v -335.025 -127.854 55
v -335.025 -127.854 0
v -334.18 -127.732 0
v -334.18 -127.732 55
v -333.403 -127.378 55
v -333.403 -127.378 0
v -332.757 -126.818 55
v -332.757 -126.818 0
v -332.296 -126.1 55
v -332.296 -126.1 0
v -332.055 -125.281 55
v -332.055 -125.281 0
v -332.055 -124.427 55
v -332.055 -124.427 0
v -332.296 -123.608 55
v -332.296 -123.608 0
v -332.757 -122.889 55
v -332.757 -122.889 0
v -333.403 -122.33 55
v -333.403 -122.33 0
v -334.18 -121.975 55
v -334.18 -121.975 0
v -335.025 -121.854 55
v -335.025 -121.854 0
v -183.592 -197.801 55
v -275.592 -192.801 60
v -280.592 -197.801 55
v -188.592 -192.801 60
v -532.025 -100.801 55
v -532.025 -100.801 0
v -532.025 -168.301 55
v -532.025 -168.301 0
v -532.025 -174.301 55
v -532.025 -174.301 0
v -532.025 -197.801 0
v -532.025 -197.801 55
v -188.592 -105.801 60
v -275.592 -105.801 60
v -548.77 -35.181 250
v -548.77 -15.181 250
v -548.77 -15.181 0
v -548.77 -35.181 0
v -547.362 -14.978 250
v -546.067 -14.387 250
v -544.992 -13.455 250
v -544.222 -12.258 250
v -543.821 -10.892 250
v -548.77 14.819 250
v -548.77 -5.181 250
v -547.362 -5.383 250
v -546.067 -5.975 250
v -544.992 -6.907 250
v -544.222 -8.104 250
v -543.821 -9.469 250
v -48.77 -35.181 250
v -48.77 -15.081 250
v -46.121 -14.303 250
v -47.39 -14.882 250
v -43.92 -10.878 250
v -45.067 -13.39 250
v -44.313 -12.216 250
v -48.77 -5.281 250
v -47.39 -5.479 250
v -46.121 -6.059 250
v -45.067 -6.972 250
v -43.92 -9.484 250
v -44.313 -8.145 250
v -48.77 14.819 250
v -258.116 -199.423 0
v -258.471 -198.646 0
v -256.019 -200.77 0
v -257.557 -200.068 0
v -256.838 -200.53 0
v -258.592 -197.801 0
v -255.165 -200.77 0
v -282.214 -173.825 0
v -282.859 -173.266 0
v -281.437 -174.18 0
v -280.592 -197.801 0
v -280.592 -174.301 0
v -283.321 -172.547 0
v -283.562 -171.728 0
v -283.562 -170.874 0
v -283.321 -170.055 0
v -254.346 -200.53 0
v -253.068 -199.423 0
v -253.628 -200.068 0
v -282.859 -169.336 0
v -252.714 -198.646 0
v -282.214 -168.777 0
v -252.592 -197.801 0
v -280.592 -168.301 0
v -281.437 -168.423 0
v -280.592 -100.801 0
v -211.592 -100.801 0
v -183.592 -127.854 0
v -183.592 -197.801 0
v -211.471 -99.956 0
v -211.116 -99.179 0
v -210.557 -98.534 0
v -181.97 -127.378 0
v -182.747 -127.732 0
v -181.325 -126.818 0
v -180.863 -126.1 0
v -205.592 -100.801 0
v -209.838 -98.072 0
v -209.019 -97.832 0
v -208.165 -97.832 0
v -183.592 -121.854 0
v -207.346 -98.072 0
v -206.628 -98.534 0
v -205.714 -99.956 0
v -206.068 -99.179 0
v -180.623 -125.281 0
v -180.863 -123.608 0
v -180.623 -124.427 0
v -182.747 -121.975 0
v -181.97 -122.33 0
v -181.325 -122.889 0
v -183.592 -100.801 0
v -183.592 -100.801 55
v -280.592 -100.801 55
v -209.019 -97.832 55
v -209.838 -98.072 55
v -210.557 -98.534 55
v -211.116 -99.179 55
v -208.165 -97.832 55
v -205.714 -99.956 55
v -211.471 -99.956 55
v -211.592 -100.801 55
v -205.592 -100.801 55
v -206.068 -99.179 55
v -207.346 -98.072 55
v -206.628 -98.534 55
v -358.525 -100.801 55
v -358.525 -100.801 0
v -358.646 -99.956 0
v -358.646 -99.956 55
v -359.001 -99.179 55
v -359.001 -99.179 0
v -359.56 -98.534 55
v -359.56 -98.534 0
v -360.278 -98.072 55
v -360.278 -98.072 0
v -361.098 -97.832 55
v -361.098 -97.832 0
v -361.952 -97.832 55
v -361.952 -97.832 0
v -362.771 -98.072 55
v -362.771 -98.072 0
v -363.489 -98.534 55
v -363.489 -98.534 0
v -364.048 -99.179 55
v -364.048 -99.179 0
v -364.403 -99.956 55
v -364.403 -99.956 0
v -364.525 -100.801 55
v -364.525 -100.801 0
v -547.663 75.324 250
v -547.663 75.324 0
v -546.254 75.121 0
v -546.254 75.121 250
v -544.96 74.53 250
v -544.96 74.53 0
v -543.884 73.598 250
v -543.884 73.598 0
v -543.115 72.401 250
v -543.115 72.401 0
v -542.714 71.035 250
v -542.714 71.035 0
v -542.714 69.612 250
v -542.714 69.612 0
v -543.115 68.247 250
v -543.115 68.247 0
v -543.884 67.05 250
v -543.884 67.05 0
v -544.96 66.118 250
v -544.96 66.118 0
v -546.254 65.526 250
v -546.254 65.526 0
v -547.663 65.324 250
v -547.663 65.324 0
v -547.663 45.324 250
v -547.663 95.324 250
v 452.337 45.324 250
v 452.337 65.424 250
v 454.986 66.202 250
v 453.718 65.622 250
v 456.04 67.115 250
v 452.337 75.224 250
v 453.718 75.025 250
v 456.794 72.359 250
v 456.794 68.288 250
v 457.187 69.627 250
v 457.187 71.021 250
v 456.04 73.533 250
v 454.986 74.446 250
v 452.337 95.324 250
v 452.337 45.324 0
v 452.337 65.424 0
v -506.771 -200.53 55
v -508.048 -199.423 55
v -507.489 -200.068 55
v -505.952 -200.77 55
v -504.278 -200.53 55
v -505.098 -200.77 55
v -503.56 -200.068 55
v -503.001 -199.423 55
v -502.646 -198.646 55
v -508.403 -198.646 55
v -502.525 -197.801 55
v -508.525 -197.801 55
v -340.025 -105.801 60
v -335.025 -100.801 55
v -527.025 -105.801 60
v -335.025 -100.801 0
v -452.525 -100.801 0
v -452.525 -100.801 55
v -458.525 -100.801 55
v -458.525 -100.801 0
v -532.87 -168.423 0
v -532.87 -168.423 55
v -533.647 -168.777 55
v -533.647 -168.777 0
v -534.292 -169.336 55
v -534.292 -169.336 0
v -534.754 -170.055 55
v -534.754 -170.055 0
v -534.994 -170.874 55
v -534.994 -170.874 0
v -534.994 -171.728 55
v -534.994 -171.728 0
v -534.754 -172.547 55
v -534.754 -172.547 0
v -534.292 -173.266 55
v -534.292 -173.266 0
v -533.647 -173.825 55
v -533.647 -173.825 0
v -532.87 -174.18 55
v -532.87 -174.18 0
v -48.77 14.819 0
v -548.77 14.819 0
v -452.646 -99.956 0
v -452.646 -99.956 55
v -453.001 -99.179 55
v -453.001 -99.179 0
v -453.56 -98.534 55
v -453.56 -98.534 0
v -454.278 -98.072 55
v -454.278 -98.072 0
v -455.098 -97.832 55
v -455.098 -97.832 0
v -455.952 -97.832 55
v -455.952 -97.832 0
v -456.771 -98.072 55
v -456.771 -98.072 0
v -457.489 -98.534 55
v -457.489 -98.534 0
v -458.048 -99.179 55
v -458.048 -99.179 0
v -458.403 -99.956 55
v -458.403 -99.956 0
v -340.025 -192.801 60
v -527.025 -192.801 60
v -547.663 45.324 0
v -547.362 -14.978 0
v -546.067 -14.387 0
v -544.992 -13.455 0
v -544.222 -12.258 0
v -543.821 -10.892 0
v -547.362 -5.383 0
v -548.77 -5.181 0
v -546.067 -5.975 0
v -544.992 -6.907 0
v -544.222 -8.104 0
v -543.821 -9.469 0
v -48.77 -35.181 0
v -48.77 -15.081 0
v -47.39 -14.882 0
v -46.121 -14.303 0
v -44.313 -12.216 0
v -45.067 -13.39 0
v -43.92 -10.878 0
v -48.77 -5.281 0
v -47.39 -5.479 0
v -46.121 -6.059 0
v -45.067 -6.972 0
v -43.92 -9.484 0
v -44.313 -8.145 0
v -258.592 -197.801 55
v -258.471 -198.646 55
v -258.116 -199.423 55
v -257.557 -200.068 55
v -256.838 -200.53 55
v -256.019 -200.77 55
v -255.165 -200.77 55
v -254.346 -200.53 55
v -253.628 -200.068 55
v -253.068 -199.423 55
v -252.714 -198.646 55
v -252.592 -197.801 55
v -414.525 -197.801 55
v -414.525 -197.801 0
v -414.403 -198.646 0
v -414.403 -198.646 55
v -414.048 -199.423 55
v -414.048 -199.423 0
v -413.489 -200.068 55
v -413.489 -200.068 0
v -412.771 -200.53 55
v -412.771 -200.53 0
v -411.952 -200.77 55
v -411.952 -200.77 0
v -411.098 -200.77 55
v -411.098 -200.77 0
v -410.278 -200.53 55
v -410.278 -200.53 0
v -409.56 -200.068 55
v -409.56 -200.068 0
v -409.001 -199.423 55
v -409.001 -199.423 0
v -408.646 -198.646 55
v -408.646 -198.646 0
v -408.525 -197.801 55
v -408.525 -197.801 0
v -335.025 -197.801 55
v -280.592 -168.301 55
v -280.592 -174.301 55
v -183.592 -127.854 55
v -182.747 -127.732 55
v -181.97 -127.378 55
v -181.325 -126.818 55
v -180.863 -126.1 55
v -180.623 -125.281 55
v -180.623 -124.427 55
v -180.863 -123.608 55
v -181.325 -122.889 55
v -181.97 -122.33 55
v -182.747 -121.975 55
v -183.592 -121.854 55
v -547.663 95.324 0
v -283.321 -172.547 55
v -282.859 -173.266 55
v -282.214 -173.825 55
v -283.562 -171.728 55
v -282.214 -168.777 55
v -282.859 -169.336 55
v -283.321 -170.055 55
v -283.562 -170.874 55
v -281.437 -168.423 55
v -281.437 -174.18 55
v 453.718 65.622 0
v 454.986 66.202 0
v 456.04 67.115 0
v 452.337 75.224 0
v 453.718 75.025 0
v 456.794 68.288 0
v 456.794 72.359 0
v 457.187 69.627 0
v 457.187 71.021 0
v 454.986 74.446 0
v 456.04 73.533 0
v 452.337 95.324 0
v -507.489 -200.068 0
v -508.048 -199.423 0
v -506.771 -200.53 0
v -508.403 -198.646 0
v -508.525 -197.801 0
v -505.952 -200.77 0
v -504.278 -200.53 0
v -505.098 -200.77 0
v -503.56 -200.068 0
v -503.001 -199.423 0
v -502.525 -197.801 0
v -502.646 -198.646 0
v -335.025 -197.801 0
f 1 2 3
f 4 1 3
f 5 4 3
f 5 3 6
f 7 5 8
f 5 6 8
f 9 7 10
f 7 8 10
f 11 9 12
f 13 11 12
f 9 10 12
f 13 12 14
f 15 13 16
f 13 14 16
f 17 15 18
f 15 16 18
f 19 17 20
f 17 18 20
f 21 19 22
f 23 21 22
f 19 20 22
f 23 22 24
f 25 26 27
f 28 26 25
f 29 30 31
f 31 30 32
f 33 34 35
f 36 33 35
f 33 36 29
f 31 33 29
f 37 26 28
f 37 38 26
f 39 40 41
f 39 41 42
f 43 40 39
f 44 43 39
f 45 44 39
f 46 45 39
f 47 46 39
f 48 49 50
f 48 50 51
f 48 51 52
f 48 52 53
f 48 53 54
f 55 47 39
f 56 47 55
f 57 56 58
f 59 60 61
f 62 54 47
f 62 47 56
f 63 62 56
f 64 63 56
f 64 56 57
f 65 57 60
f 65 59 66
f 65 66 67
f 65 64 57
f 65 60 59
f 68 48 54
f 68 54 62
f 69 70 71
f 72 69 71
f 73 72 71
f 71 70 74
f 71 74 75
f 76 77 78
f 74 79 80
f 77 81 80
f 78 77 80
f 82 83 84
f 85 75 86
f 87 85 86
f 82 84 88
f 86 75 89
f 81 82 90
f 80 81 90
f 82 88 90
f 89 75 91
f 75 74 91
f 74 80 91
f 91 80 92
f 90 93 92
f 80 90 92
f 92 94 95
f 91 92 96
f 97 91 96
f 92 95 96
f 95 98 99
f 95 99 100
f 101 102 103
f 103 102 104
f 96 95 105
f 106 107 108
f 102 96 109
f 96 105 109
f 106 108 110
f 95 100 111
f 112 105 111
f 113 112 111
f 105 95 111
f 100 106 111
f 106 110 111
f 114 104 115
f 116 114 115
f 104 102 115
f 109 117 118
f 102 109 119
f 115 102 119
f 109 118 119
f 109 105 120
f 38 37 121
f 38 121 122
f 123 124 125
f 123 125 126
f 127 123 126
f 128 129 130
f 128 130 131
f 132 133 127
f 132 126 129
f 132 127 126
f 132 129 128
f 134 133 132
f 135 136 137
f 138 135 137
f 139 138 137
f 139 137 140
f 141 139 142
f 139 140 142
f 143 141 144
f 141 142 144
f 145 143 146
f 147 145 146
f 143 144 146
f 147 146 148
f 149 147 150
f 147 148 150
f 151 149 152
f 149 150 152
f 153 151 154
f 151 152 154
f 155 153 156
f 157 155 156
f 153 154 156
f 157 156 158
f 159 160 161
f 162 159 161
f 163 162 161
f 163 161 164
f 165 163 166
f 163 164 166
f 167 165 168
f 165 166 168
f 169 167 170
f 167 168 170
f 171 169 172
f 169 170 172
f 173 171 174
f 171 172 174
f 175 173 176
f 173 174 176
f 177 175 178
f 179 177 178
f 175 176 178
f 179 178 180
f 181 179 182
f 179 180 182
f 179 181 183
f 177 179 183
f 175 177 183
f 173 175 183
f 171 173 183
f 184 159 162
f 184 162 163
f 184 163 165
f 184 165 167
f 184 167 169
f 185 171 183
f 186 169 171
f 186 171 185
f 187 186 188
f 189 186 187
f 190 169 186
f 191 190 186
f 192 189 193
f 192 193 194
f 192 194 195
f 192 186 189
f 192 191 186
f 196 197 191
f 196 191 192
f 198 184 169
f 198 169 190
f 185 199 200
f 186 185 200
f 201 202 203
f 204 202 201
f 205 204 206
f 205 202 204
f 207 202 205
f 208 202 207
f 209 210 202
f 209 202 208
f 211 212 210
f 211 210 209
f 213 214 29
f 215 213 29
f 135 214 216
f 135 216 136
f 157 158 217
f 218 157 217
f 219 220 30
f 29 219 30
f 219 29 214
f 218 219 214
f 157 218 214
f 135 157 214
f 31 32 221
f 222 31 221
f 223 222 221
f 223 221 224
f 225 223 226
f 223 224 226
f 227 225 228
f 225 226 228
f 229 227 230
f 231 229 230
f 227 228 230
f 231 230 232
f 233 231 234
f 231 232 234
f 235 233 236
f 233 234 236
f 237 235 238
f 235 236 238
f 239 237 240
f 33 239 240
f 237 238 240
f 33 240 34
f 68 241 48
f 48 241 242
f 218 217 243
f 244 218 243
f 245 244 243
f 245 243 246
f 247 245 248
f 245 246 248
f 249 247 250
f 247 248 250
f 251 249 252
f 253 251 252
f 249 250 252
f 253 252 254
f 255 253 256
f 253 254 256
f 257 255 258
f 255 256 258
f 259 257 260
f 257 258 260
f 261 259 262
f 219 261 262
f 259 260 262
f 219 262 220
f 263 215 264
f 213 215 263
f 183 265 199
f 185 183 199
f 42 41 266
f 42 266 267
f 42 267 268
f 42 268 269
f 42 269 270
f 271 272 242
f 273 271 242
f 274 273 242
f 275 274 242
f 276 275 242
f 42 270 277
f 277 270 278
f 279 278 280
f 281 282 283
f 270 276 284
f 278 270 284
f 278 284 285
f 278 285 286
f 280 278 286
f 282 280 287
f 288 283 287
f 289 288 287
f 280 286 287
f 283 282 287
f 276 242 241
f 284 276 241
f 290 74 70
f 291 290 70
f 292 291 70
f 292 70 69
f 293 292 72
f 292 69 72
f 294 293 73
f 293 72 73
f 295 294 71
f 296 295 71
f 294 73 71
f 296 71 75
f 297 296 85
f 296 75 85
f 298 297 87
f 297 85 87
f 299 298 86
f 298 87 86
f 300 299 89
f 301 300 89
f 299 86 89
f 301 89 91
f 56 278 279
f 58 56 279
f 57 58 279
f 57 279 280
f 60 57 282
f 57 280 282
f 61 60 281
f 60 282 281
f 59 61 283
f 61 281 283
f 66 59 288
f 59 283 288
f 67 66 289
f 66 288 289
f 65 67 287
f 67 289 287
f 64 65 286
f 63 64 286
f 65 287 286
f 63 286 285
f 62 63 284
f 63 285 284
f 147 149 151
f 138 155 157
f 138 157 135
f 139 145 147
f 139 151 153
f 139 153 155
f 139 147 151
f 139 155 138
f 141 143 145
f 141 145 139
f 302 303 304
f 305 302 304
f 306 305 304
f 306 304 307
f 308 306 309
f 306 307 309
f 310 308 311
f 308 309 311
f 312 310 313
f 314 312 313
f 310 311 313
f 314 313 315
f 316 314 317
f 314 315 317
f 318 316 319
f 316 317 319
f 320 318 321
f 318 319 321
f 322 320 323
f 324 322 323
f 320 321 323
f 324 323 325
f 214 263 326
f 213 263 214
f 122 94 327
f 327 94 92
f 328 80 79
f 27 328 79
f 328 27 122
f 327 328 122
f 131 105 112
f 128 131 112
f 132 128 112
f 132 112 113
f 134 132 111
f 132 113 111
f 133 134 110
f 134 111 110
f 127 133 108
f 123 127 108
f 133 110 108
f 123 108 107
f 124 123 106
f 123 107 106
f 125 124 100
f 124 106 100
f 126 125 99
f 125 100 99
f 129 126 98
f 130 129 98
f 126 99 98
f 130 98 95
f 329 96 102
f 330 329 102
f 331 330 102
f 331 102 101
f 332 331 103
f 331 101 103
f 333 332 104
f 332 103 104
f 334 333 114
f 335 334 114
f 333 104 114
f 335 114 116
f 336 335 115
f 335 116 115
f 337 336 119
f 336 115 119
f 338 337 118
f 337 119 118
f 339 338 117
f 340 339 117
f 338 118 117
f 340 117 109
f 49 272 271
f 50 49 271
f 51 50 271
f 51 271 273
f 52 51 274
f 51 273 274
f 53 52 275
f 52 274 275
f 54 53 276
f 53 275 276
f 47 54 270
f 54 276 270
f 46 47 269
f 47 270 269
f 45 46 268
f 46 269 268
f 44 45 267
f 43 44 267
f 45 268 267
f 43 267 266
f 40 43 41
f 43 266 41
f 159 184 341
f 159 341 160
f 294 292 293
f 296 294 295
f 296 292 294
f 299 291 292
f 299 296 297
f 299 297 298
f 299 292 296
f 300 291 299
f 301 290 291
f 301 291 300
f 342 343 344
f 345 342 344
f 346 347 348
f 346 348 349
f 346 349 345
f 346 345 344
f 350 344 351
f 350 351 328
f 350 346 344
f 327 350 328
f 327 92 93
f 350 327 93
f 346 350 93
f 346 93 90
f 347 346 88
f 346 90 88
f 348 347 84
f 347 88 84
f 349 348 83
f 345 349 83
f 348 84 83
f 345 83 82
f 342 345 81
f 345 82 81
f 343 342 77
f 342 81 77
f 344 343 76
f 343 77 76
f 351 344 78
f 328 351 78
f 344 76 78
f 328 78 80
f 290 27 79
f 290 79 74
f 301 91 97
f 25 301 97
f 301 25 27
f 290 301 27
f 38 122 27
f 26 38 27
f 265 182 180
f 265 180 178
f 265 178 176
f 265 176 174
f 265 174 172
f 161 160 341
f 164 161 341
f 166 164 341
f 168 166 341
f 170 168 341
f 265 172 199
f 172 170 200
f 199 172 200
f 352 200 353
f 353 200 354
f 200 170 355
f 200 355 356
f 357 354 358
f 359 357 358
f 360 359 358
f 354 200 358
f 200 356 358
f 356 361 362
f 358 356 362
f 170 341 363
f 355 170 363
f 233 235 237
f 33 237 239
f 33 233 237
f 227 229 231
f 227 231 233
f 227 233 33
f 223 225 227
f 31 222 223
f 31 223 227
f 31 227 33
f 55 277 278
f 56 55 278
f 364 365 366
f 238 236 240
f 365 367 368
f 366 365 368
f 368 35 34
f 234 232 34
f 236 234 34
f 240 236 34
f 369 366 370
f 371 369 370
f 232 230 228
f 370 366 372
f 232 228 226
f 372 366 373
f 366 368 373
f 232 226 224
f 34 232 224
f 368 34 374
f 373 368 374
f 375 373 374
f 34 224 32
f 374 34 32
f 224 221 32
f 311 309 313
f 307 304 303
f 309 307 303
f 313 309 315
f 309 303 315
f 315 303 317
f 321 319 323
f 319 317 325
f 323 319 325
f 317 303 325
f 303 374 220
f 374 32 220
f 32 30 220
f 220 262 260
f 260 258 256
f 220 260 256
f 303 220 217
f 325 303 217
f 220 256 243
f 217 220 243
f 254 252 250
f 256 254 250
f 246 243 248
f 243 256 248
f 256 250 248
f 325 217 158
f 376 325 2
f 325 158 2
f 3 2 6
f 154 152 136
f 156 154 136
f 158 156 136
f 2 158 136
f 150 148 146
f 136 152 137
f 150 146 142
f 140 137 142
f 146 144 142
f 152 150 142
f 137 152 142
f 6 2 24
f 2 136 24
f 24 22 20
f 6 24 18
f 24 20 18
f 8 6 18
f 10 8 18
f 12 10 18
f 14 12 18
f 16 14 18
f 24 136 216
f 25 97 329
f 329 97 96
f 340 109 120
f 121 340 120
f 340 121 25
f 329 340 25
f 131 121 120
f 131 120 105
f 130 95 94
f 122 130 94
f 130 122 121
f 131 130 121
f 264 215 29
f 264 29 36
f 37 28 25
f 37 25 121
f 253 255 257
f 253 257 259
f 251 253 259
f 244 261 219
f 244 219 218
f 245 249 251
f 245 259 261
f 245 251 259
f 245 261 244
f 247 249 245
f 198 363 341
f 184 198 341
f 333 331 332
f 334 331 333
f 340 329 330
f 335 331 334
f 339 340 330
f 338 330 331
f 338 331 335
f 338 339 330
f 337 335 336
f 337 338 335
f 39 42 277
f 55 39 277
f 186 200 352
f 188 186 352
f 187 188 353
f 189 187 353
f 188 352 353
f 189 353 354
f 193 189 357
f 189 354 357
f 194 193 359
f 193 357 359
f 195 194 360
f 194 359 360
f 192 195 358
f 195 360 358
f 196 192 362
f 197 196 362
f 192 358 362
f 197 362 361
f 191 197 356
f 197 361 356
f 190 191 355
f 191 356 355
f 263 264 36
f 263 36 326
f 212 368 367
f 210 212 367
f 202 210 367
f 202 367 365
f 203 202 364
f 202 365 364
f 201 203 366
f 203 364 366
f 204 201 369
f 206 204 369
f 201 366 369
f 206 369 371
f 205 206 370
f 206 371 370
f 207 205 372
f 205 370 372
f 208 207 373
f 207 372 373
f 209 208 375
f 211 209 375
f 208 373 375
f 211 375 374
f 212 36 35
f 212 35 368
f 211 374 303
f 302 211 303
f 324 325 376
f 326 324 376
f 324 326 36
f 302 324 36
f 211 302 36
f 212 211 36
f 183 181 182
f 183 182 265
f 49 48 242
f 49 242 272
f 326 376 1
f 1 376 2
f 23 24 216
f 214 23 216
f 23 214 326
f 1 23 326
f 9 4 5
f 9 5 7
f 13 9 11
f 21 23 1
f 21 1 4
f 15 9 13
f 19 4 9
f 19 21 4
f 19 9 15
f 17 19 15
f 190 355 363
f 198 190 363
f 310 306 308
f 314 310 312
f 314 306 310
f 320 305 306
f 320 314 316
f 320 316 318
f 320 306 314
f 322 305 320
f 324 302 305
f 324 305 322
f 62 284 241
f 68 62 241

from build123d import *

# Parameters (mm, degrees)
F1_DEPTH = 250
F3_DEPTH = 55
F5_DEPTH = 5
F6_SIZE  = 4.99999
F8_DEPTH = 5
F9_SIZE  = 4.99999


# Not quite as in the source:
# - a fillet or chamfer is up to 0.001 mm smaller than in the source, because OpenCascade refuses the exact size
# - a feature names something its author has since deleted; it is built from what else it names


with BuildPart() as f1:
    # F0 (on Top) → F1 (new body)
    with BuildSketch(Plane.XY):
        with BuildLine():
            Line((-547.6627070457, 65.3239125144), (-547.6627070457, 45.3239125144))
            Line((-547.6627070457, 45.3239125144), (452.3372929543, 45.3239125144))
            Line((452.3372929543, 45.3239125144), (452.3372929543, 65.4239125144))
            ThreePointArc((452.3372929543, 65.4239125144), (457.2372929543, 70.3239125144), (452.3372929543, 75.2239125144))
            Line((452.3372929543, 75.2239125144), (452.3372929543, 95.3239125144))
            Line((452.3372929543, 95.3239125144), (-547.6627070457, 95.3239125144))
            Line((-547.6627070457, 95.3239125144), (-547.6627070457, 75.3239125144))
            ThreePointArc((-547.6627070457, 75.3239125144), (-542.6627070457, 70.3239125144), (-547.6627070457, 65.3239125144))
        make_face()
    extrude(amount=F1_DEPTH)


with BuildPart() as f1b:
    # F0 (on Top) → F1, piece 2 (new body)
    with BuildSketch(Plane.XY):
        with BuildLine():
            Line((-548.7702705837, -15.180903133), (-548.7702705837, -35.180903133))
            Line((-548.7702705837, -35.180903133), (-48.7702705837, -35.180903133))
            Line((-48.7702705837, -35.180903133), (-48.7702705837, -15.080903133))
            ThreePointArc((-48.7702705837, -15.080903133), (-43.8702705837, -10.180903133), (-48.7702705837, -5.280903133))
            Line((-48.7702705837, -5.280903133), (-48.7702705837, 14.819096867))
            Line((-48.7702705837, 14.819096867), (-548.7702705837, 14.819096867))
            Line((-548.7702705837, 14.819096867), (-548.7702705837, -5.180903133))
            ThreePointArc((-548.7702705837, -5.180903133), (-543.7702705837, -10.180903133), (-548.7702705837, -15.180903133))
        make_face()
    extrude(amount=F1_DEPTH)


with BuildPart() as f3:
    # F2 (on Top) → F3 (new body)
    with BuildSketch(Plane.XY):
        with BuildLine():
            Line((-532.024698019, -197.8010260633), (-508.524698019, -197.8010260633))
            ThreePointArc((-508.524698019, -197.8010260633), (-505.524698019, -200.8010260633), (-502.524698019, -197.8010260633))
            Line((-502.524698019, -197.8010260633), (-414.524698019, -197.8010260633))
            ThreePointArc((-414.524698019, -197.8010260633), (-411.524698019, -200.8010260633), (-408.524698019, -197.8010260633))
            Line((-408.524698019, -197.8010260633), (-335.024698019, -197.8010260633))
            Line((-335.024698019, -197.8010260633), (-335.024698019, -127.8537809849))
            ThreePointArc((-335.024698019, -127.8537809849), (-332.024698019, -124.8537809849), (-335.024698019, -121.8537809849))
            Line((-335.024698019, -121.8537809849), (-335.024698019, -100.8010260633))
            Line((-335.024698019, -100.8010260633), (-358.524698019, -100.8010260633))
            ThreePointArc((-358.524698019, -100.8010260633), (-361.524698019, -97.8010260633), (-364.524698019, -100.8010260633))
            Line((-364.524698019, -100.8010260633), (-452.524698019, -100.8010260633))
            ThreePointArc((-452.524698019, -100.8010260633), (-455.524698019, -97.8010260633), (-458.524698019, -100.8010260633))
            Line((-458.524698019, -100.8010260633), (-532.024698019, -100.8010260633))
            Line((-532.024698019, -100.8010260633), (-532.024698019, -168.3010260633))
            ThreePointArc((-532.024698019, -168.3010260633), (-535.024698019, -171.3010260633), (-532.024698019, -174.3010260633))
            Line((-532.024698019, -174.3010260633), (-532.024698019, -197.8010260633))
        make_face()
    extrude(amount=F3_DEPTH)

    # F4 (on face) → F5 (join)
    with BuildSketch(Plane.XY.offset(55)):
        Polygon((-532.024698019, -100.8010260633), (-532.024698019, -168.3010260633), (-532.024698019, -174.3010260633), (-532.024698019, -197.8010260633), (-508.524698019, -197.8010260633), (-502.524698019, -197.8010260633), (-414.524698019, -197.8010260633), (-408.524698019, -197.8010260633), (-335.024698019, -197.8010260633), (-335.024698019, -127.8537809849), (-335.024698019, -121.8537809849), (-335.024698019, -100.8010260633), (-358.524698019, -100.8010260633), (-364.524698019, -100.8010260633), (-452.524698019, -100.8010260633), (-458.524698019, -100.8010260633), align=None)
    extrude(amount=F5_DEPTH)

    # F6 (size 5 in the source; OpenCascade refuses exactly that, so slightly less here)
    f6_edges = [f3.edges().sort_by_distance(p)[0] for p in [
        (-433.524698, -100.801026, 60),
        (-532.024698, -149.301026, 60),
        (-433.524698, -197.801026, 60),
        (-335.024698, -149.301026, 60),
    ]]
    chamfer(f6_edges, length=F6_SIZE)


with BuildPart() as f3b:
    # F2 (on Top) → F3, piece 2 (new body)
    with BuildSketch(Plane.XY):
        Polygon((-280.5922329426, -174.3010260633), (-280.5922329426, -197.8010260633), (-258.5922329426, -197.8010260633), (-252.5922329426, -197.8010260633), (-183.5922329426, -197.8010260633), (-183.5922329426, -127.8537809849), (-183.5922329426, -121.8537809849), (-183.5922329426, -100.8010260633), (-205.5922329426, -100.8010260633), (-211.5922329426, -100.8010260633), (-280.5922329426, -100.8010260633), (-280.5922329426, -168.3010260633), align=None)
        with BuildLine():
            ThreePointArc((-280.5922329426, -168.3010260633), (-283.5922329426, -171.3010260633), (-280.5922329426, -174.3010260633))
            Line((-280.5922329426, -174.3010260633), (-280.5922329426, -168.3010260633))
        make_face()
        with BuildLine():
            Line((-252.5922329426, -197.8010260633), (-258.5922329426, -197.8010260633))
            ThreePointArc((-258.5922329426, -197.8010260633), (-255.5922329426, -200.8010260633), (-252.5922329426, -197.8010260633))
        make_face()
        with BuildLine():
            Line((-183.5922329426, -121.8537809849), (-183.5922329426, -127.8537809849))
            ThreePointArc((-183.5922329426, -127.8537809849), (-180.5922329426, -124.8537809849), (-183.5922329426, -121.8537809849))
        make_face()
        with BuildLine():
            ThreePointArc((-205.5922329426, -100.8010260633), (-208.5922329426, -97.8010260633), (-211.5922329426, -100.8010260633))
            Line((-211.5922329426, -100.8010260633), (-205.5922329426, -100.8010260633))
        make_face()
    extrude(amount=F3_DEPTH)

    # F7 (on face) → F8 (join)
    with BuildSketch(Plane.XY.offset(55)):
        Polygon((-280.5922329426, -168.3010260633), (-280.5922329426, -174.3010260633), (-280.5922329426, -197.8010260633), (-258.5922329426, -197.8010260633), (-252.5922329426, -197.8010260633), (-183.5922329426, -197.8010260633), (-183.5922329426, -127.8537809849), (-183.5922329426, -121.8537809849), (-183.5922329426, -100.8010260633), (-205.5922329426, -100.8010260633), (-211.5922329426, -100.8010260633), (-280.5922329426, -100.8010260633), align=None)
    extrude(amount=F8_DEPTH)

    # F9 (size 5 in the source; OpenCascade refuses exactly that, so slightly less here)
    f9_edges = [f3b.edges().sort_by_distance(p)[0] for p in [
        (-232.092233, -197.801026, 60),
        (-183.592233, -149.301026, 60),
        (-232.092233, -100.801026, 60),
        (-280.592233, -149.301026, 60),
    ]]
    chamfer(f9_edges, length=F9_SIZE)


solid = Compound([f1.part, f1b.part, f3.part, f3b.part])
